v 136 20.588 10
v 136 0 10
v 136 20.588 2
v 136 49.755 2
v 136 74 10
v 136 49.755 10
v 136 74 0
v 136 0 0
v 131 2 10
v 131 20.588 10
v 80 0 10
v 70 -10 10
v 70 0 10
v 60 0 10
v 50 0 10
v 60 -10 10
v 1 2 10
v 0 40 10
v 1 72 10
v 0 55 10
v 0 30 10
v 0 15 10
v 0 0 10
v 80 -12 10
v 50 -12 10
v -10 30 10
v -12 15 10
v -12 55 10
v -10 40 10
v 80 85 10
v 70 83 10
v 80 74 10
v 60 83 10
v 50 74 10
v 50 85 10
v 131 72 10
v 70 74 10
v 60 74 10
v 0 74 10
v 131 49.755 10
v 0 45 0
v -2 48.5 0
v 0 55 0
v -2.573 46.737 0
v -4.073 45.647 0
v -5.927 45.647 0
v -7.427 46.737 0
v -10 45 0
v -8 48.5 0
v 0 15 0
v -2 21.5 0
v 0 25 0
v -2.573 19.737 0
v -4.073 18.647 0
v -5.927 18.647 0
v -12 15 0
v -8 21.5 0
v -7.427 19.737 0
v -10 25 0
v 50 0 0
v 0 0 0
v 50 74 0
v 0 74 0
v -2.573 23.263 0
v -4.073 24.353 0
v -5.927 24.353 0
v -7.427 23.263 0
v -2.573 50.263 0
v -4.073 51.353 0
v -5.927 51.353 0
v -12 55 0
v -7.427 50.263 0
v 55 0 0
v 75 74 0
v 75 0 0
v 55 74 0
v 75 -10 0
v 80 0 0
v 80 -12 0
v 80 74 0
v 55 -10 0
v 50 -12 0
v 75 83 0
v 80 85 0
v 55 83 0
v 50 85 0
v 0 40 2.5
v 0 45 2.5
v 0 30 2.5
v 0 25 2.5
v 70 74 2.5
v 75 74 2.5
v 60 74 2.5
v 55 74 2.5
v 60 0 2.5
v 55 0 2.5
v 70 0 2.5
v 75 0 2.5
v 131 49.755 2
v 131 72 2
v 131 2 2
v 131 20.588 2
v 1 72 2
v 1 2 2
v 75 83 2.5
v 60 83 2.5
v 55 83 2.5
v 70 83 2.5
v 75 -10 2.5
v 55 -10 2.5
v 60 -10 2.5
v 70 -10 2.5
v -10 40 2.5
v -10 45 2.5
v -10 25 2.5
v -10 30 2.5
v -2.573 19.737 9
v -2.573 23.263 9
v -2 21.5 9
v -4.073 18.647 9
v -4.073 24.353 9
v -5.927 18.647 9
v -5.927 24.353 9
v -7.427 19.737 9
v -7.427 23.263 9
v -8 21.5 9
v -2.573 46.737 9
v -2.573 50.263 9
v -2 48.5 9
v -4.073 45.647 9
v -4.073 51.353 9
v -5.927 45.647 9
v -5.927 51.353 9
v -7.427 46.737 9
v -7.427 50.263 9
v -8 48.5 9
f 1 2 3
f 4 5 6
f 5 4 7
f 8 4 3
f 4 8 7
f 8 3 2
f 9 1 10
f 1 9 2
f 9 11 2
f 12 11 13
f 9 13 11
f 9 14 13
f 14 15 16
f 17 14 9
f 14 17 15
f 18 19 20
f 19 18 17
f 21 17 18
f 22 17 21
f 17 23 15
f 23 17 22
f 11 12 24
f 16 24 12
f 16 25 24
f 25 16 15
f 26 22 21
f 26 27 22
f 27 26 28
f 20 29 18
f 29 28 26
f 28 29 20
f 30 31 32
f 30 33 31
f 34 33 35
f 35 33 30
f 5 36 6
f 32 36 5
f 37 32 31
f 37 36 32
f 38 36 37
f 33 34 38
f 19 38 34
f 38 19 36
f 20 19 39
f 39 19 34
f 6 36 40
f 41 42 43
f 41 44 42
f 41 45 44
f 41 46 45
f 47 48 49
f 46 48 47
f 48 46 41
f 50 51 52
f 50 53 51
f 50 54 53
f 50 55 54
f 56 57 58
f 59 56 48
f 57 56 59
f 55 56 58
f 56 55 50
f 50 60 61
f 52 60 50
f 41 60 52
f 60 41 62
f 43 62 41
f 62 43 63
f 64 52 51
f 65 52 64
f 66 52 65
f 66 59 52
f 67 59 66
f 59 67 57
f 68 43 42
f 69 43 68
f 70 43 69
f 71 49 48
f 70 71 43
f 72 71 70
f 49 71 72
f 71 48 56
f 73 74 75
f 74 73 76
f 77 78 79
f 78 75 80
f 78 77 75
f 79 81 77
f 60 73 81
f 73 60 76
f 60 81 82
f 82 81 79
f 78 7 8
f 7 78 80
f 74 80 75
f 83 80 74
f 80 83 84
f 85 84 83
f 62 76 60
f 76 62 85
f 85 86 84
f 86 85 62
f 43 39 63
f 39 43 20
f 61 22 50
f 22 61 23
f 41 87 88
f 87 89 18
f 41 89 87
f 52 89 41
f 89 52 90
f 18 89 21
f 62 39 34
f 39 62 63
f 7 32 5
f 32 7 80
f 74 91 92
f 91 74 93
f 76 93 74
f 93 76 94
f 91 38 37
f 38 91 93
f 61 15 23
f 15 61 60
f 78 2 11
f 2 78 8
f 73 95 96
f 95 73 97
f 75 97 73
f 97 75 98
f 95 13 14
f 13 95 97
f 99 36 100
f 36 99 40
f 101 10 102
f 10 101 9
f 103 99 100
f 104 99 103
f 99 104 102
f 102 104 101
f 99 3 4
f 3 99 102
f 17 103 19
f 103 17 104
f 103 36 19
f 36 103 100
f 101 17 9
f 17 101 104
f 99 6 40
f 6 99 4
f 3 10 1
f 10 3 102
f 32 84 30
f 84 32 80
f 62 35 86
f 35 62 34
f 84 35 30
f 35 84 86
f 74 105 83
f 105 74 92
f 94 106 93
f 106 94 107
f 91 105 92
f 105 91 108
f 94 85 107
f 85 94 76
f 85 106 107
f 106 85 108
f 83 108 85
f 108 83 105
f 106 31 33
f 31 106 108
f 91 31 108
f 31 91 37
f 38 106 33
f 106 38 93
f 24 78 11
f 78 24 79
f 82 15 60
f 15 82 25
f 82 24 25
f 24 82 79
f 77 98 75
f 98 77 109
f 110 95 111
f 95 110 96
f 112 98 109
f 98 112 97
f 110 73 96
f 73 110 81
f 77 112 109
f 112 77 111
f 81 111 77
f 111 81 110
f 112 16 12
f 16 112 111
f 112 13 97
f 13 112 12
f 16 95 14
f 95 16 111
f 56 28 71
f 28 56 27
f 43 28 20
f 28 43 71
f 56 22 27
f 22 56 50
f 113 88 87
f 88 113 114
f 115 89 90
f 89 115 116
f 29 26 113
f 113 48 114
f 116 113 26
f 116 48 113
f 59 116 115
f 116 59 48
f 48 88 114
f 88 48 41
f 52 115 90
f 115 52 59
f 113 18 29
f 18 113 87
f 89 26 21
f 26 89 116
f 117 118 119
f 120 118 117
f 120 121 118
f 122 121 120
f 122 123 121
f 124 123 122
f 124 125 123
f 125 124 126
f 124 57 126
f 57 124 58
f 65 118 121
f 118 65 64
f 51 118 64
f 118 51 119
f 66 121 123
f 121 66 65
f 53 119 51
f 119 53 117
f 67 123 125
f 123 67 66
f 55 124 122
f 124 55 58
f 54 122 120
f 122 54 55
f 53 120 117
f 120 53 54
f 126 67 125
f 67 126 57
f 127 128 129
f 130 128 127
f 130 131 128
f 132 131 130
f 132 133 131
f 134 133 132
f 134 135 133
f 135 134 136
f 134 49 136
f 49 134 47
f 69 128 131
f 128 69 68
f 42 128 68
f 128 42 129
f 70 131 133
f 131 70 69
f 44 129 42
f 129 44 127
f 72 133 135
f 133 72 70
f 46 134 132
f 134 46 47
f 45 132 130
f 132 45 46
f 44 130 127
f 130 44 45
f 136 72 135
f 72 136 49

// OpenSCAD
Length=130;
Width=70;

difference(){cube([Length+6,Width+4,10]);
translate([1,2,2])cube([Length,Width,10]);
translate([Length,Width/3.4,2])cube([50,Width/2.4,10]);}


translate([Length-130,Width-69,0])
union(){difference(){translate([50,72,0])cube([30,12,10]);
translate([55,72,-17.5])cube([20,10,20]);
translate([60,72,-15])cube([10,10,30]);}}

translate([Length-130,5,0])
union(){difference(){translate([50,-17,0])cube([30,12,10]);
translate([55,-15,-17.5])cube([20,10,20]);
translate([60,-15,-15])cube([10,10,30]);}}

translate([0,(Width/2)-35,0])
union(){difference(){translate([-12,15,0])cube([12,40,10]);
translate([-10,25,-17.5])cube([10,20,20]);
translate([-10,30,-15])cube([10,10,30]);
translate([-5,21.5,-6])cylinder(r=3,h=15);
translate([-5,48.5,-6])cylinder(r=3,h=15);
}}


